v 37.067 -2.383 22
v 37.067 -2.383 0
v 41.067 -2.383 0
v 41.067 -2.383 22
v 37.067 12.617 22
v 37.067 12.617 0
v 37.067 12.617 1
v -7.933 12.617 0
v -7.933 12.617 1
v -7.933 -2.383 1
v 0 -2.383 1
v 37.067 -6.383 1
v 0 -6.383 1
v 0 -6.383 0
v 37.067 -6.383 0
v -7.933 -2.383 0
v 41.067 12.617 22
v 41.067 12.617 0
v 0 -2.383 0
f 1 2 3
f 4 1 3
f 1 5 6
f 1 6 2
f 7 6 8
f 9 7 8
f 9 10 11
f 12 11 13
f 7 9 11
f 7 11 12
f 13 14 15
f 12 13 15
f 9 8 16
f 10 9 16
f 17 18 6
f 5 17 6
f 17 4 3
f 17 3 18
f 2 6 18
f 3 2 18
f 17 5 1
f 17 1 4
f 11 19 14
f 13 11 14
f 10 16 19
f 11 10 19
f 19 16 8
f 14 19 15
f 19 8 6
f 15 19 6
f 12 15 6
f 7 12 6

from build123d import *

# Parameters (mm, degrees)
F1_DEPTH = 22
F2_DEPTH = 1


with BuildPart() as f1:
    # F0 (on Top) → F1 (new body)
    with BuildSketch(Plane.XY):
        Polygon((41.0671858334, 12.6168608051), (37.0671858334, 12.6168608051), (37.0671858334, 8.6168608051), (37.0671858334, -2.3831391949), (41.0671858334, -2.3831391949), align=None)
    extrude(amount=F1_DEPTH)


with BuildPart() as f2:
    # F0 (on Top) → F2 (new body)
    with BuildSketch(Plane.XY):
        Polygon((37.0671858334, 12.6168608051), (-7.9328141666, 12.6168608051), (-7.9328141666, -2.3831391949), (0, -2.3831391949), (0, -6.3831391949), (37.0671858334, -6.3831391949), (37.0671858334, -2.3831391949), (37.0671858334, 8.6168608051), align=None)
    extrude(amount=F2_DEPTH)


solid = Compound([f1.part, f2.part])
